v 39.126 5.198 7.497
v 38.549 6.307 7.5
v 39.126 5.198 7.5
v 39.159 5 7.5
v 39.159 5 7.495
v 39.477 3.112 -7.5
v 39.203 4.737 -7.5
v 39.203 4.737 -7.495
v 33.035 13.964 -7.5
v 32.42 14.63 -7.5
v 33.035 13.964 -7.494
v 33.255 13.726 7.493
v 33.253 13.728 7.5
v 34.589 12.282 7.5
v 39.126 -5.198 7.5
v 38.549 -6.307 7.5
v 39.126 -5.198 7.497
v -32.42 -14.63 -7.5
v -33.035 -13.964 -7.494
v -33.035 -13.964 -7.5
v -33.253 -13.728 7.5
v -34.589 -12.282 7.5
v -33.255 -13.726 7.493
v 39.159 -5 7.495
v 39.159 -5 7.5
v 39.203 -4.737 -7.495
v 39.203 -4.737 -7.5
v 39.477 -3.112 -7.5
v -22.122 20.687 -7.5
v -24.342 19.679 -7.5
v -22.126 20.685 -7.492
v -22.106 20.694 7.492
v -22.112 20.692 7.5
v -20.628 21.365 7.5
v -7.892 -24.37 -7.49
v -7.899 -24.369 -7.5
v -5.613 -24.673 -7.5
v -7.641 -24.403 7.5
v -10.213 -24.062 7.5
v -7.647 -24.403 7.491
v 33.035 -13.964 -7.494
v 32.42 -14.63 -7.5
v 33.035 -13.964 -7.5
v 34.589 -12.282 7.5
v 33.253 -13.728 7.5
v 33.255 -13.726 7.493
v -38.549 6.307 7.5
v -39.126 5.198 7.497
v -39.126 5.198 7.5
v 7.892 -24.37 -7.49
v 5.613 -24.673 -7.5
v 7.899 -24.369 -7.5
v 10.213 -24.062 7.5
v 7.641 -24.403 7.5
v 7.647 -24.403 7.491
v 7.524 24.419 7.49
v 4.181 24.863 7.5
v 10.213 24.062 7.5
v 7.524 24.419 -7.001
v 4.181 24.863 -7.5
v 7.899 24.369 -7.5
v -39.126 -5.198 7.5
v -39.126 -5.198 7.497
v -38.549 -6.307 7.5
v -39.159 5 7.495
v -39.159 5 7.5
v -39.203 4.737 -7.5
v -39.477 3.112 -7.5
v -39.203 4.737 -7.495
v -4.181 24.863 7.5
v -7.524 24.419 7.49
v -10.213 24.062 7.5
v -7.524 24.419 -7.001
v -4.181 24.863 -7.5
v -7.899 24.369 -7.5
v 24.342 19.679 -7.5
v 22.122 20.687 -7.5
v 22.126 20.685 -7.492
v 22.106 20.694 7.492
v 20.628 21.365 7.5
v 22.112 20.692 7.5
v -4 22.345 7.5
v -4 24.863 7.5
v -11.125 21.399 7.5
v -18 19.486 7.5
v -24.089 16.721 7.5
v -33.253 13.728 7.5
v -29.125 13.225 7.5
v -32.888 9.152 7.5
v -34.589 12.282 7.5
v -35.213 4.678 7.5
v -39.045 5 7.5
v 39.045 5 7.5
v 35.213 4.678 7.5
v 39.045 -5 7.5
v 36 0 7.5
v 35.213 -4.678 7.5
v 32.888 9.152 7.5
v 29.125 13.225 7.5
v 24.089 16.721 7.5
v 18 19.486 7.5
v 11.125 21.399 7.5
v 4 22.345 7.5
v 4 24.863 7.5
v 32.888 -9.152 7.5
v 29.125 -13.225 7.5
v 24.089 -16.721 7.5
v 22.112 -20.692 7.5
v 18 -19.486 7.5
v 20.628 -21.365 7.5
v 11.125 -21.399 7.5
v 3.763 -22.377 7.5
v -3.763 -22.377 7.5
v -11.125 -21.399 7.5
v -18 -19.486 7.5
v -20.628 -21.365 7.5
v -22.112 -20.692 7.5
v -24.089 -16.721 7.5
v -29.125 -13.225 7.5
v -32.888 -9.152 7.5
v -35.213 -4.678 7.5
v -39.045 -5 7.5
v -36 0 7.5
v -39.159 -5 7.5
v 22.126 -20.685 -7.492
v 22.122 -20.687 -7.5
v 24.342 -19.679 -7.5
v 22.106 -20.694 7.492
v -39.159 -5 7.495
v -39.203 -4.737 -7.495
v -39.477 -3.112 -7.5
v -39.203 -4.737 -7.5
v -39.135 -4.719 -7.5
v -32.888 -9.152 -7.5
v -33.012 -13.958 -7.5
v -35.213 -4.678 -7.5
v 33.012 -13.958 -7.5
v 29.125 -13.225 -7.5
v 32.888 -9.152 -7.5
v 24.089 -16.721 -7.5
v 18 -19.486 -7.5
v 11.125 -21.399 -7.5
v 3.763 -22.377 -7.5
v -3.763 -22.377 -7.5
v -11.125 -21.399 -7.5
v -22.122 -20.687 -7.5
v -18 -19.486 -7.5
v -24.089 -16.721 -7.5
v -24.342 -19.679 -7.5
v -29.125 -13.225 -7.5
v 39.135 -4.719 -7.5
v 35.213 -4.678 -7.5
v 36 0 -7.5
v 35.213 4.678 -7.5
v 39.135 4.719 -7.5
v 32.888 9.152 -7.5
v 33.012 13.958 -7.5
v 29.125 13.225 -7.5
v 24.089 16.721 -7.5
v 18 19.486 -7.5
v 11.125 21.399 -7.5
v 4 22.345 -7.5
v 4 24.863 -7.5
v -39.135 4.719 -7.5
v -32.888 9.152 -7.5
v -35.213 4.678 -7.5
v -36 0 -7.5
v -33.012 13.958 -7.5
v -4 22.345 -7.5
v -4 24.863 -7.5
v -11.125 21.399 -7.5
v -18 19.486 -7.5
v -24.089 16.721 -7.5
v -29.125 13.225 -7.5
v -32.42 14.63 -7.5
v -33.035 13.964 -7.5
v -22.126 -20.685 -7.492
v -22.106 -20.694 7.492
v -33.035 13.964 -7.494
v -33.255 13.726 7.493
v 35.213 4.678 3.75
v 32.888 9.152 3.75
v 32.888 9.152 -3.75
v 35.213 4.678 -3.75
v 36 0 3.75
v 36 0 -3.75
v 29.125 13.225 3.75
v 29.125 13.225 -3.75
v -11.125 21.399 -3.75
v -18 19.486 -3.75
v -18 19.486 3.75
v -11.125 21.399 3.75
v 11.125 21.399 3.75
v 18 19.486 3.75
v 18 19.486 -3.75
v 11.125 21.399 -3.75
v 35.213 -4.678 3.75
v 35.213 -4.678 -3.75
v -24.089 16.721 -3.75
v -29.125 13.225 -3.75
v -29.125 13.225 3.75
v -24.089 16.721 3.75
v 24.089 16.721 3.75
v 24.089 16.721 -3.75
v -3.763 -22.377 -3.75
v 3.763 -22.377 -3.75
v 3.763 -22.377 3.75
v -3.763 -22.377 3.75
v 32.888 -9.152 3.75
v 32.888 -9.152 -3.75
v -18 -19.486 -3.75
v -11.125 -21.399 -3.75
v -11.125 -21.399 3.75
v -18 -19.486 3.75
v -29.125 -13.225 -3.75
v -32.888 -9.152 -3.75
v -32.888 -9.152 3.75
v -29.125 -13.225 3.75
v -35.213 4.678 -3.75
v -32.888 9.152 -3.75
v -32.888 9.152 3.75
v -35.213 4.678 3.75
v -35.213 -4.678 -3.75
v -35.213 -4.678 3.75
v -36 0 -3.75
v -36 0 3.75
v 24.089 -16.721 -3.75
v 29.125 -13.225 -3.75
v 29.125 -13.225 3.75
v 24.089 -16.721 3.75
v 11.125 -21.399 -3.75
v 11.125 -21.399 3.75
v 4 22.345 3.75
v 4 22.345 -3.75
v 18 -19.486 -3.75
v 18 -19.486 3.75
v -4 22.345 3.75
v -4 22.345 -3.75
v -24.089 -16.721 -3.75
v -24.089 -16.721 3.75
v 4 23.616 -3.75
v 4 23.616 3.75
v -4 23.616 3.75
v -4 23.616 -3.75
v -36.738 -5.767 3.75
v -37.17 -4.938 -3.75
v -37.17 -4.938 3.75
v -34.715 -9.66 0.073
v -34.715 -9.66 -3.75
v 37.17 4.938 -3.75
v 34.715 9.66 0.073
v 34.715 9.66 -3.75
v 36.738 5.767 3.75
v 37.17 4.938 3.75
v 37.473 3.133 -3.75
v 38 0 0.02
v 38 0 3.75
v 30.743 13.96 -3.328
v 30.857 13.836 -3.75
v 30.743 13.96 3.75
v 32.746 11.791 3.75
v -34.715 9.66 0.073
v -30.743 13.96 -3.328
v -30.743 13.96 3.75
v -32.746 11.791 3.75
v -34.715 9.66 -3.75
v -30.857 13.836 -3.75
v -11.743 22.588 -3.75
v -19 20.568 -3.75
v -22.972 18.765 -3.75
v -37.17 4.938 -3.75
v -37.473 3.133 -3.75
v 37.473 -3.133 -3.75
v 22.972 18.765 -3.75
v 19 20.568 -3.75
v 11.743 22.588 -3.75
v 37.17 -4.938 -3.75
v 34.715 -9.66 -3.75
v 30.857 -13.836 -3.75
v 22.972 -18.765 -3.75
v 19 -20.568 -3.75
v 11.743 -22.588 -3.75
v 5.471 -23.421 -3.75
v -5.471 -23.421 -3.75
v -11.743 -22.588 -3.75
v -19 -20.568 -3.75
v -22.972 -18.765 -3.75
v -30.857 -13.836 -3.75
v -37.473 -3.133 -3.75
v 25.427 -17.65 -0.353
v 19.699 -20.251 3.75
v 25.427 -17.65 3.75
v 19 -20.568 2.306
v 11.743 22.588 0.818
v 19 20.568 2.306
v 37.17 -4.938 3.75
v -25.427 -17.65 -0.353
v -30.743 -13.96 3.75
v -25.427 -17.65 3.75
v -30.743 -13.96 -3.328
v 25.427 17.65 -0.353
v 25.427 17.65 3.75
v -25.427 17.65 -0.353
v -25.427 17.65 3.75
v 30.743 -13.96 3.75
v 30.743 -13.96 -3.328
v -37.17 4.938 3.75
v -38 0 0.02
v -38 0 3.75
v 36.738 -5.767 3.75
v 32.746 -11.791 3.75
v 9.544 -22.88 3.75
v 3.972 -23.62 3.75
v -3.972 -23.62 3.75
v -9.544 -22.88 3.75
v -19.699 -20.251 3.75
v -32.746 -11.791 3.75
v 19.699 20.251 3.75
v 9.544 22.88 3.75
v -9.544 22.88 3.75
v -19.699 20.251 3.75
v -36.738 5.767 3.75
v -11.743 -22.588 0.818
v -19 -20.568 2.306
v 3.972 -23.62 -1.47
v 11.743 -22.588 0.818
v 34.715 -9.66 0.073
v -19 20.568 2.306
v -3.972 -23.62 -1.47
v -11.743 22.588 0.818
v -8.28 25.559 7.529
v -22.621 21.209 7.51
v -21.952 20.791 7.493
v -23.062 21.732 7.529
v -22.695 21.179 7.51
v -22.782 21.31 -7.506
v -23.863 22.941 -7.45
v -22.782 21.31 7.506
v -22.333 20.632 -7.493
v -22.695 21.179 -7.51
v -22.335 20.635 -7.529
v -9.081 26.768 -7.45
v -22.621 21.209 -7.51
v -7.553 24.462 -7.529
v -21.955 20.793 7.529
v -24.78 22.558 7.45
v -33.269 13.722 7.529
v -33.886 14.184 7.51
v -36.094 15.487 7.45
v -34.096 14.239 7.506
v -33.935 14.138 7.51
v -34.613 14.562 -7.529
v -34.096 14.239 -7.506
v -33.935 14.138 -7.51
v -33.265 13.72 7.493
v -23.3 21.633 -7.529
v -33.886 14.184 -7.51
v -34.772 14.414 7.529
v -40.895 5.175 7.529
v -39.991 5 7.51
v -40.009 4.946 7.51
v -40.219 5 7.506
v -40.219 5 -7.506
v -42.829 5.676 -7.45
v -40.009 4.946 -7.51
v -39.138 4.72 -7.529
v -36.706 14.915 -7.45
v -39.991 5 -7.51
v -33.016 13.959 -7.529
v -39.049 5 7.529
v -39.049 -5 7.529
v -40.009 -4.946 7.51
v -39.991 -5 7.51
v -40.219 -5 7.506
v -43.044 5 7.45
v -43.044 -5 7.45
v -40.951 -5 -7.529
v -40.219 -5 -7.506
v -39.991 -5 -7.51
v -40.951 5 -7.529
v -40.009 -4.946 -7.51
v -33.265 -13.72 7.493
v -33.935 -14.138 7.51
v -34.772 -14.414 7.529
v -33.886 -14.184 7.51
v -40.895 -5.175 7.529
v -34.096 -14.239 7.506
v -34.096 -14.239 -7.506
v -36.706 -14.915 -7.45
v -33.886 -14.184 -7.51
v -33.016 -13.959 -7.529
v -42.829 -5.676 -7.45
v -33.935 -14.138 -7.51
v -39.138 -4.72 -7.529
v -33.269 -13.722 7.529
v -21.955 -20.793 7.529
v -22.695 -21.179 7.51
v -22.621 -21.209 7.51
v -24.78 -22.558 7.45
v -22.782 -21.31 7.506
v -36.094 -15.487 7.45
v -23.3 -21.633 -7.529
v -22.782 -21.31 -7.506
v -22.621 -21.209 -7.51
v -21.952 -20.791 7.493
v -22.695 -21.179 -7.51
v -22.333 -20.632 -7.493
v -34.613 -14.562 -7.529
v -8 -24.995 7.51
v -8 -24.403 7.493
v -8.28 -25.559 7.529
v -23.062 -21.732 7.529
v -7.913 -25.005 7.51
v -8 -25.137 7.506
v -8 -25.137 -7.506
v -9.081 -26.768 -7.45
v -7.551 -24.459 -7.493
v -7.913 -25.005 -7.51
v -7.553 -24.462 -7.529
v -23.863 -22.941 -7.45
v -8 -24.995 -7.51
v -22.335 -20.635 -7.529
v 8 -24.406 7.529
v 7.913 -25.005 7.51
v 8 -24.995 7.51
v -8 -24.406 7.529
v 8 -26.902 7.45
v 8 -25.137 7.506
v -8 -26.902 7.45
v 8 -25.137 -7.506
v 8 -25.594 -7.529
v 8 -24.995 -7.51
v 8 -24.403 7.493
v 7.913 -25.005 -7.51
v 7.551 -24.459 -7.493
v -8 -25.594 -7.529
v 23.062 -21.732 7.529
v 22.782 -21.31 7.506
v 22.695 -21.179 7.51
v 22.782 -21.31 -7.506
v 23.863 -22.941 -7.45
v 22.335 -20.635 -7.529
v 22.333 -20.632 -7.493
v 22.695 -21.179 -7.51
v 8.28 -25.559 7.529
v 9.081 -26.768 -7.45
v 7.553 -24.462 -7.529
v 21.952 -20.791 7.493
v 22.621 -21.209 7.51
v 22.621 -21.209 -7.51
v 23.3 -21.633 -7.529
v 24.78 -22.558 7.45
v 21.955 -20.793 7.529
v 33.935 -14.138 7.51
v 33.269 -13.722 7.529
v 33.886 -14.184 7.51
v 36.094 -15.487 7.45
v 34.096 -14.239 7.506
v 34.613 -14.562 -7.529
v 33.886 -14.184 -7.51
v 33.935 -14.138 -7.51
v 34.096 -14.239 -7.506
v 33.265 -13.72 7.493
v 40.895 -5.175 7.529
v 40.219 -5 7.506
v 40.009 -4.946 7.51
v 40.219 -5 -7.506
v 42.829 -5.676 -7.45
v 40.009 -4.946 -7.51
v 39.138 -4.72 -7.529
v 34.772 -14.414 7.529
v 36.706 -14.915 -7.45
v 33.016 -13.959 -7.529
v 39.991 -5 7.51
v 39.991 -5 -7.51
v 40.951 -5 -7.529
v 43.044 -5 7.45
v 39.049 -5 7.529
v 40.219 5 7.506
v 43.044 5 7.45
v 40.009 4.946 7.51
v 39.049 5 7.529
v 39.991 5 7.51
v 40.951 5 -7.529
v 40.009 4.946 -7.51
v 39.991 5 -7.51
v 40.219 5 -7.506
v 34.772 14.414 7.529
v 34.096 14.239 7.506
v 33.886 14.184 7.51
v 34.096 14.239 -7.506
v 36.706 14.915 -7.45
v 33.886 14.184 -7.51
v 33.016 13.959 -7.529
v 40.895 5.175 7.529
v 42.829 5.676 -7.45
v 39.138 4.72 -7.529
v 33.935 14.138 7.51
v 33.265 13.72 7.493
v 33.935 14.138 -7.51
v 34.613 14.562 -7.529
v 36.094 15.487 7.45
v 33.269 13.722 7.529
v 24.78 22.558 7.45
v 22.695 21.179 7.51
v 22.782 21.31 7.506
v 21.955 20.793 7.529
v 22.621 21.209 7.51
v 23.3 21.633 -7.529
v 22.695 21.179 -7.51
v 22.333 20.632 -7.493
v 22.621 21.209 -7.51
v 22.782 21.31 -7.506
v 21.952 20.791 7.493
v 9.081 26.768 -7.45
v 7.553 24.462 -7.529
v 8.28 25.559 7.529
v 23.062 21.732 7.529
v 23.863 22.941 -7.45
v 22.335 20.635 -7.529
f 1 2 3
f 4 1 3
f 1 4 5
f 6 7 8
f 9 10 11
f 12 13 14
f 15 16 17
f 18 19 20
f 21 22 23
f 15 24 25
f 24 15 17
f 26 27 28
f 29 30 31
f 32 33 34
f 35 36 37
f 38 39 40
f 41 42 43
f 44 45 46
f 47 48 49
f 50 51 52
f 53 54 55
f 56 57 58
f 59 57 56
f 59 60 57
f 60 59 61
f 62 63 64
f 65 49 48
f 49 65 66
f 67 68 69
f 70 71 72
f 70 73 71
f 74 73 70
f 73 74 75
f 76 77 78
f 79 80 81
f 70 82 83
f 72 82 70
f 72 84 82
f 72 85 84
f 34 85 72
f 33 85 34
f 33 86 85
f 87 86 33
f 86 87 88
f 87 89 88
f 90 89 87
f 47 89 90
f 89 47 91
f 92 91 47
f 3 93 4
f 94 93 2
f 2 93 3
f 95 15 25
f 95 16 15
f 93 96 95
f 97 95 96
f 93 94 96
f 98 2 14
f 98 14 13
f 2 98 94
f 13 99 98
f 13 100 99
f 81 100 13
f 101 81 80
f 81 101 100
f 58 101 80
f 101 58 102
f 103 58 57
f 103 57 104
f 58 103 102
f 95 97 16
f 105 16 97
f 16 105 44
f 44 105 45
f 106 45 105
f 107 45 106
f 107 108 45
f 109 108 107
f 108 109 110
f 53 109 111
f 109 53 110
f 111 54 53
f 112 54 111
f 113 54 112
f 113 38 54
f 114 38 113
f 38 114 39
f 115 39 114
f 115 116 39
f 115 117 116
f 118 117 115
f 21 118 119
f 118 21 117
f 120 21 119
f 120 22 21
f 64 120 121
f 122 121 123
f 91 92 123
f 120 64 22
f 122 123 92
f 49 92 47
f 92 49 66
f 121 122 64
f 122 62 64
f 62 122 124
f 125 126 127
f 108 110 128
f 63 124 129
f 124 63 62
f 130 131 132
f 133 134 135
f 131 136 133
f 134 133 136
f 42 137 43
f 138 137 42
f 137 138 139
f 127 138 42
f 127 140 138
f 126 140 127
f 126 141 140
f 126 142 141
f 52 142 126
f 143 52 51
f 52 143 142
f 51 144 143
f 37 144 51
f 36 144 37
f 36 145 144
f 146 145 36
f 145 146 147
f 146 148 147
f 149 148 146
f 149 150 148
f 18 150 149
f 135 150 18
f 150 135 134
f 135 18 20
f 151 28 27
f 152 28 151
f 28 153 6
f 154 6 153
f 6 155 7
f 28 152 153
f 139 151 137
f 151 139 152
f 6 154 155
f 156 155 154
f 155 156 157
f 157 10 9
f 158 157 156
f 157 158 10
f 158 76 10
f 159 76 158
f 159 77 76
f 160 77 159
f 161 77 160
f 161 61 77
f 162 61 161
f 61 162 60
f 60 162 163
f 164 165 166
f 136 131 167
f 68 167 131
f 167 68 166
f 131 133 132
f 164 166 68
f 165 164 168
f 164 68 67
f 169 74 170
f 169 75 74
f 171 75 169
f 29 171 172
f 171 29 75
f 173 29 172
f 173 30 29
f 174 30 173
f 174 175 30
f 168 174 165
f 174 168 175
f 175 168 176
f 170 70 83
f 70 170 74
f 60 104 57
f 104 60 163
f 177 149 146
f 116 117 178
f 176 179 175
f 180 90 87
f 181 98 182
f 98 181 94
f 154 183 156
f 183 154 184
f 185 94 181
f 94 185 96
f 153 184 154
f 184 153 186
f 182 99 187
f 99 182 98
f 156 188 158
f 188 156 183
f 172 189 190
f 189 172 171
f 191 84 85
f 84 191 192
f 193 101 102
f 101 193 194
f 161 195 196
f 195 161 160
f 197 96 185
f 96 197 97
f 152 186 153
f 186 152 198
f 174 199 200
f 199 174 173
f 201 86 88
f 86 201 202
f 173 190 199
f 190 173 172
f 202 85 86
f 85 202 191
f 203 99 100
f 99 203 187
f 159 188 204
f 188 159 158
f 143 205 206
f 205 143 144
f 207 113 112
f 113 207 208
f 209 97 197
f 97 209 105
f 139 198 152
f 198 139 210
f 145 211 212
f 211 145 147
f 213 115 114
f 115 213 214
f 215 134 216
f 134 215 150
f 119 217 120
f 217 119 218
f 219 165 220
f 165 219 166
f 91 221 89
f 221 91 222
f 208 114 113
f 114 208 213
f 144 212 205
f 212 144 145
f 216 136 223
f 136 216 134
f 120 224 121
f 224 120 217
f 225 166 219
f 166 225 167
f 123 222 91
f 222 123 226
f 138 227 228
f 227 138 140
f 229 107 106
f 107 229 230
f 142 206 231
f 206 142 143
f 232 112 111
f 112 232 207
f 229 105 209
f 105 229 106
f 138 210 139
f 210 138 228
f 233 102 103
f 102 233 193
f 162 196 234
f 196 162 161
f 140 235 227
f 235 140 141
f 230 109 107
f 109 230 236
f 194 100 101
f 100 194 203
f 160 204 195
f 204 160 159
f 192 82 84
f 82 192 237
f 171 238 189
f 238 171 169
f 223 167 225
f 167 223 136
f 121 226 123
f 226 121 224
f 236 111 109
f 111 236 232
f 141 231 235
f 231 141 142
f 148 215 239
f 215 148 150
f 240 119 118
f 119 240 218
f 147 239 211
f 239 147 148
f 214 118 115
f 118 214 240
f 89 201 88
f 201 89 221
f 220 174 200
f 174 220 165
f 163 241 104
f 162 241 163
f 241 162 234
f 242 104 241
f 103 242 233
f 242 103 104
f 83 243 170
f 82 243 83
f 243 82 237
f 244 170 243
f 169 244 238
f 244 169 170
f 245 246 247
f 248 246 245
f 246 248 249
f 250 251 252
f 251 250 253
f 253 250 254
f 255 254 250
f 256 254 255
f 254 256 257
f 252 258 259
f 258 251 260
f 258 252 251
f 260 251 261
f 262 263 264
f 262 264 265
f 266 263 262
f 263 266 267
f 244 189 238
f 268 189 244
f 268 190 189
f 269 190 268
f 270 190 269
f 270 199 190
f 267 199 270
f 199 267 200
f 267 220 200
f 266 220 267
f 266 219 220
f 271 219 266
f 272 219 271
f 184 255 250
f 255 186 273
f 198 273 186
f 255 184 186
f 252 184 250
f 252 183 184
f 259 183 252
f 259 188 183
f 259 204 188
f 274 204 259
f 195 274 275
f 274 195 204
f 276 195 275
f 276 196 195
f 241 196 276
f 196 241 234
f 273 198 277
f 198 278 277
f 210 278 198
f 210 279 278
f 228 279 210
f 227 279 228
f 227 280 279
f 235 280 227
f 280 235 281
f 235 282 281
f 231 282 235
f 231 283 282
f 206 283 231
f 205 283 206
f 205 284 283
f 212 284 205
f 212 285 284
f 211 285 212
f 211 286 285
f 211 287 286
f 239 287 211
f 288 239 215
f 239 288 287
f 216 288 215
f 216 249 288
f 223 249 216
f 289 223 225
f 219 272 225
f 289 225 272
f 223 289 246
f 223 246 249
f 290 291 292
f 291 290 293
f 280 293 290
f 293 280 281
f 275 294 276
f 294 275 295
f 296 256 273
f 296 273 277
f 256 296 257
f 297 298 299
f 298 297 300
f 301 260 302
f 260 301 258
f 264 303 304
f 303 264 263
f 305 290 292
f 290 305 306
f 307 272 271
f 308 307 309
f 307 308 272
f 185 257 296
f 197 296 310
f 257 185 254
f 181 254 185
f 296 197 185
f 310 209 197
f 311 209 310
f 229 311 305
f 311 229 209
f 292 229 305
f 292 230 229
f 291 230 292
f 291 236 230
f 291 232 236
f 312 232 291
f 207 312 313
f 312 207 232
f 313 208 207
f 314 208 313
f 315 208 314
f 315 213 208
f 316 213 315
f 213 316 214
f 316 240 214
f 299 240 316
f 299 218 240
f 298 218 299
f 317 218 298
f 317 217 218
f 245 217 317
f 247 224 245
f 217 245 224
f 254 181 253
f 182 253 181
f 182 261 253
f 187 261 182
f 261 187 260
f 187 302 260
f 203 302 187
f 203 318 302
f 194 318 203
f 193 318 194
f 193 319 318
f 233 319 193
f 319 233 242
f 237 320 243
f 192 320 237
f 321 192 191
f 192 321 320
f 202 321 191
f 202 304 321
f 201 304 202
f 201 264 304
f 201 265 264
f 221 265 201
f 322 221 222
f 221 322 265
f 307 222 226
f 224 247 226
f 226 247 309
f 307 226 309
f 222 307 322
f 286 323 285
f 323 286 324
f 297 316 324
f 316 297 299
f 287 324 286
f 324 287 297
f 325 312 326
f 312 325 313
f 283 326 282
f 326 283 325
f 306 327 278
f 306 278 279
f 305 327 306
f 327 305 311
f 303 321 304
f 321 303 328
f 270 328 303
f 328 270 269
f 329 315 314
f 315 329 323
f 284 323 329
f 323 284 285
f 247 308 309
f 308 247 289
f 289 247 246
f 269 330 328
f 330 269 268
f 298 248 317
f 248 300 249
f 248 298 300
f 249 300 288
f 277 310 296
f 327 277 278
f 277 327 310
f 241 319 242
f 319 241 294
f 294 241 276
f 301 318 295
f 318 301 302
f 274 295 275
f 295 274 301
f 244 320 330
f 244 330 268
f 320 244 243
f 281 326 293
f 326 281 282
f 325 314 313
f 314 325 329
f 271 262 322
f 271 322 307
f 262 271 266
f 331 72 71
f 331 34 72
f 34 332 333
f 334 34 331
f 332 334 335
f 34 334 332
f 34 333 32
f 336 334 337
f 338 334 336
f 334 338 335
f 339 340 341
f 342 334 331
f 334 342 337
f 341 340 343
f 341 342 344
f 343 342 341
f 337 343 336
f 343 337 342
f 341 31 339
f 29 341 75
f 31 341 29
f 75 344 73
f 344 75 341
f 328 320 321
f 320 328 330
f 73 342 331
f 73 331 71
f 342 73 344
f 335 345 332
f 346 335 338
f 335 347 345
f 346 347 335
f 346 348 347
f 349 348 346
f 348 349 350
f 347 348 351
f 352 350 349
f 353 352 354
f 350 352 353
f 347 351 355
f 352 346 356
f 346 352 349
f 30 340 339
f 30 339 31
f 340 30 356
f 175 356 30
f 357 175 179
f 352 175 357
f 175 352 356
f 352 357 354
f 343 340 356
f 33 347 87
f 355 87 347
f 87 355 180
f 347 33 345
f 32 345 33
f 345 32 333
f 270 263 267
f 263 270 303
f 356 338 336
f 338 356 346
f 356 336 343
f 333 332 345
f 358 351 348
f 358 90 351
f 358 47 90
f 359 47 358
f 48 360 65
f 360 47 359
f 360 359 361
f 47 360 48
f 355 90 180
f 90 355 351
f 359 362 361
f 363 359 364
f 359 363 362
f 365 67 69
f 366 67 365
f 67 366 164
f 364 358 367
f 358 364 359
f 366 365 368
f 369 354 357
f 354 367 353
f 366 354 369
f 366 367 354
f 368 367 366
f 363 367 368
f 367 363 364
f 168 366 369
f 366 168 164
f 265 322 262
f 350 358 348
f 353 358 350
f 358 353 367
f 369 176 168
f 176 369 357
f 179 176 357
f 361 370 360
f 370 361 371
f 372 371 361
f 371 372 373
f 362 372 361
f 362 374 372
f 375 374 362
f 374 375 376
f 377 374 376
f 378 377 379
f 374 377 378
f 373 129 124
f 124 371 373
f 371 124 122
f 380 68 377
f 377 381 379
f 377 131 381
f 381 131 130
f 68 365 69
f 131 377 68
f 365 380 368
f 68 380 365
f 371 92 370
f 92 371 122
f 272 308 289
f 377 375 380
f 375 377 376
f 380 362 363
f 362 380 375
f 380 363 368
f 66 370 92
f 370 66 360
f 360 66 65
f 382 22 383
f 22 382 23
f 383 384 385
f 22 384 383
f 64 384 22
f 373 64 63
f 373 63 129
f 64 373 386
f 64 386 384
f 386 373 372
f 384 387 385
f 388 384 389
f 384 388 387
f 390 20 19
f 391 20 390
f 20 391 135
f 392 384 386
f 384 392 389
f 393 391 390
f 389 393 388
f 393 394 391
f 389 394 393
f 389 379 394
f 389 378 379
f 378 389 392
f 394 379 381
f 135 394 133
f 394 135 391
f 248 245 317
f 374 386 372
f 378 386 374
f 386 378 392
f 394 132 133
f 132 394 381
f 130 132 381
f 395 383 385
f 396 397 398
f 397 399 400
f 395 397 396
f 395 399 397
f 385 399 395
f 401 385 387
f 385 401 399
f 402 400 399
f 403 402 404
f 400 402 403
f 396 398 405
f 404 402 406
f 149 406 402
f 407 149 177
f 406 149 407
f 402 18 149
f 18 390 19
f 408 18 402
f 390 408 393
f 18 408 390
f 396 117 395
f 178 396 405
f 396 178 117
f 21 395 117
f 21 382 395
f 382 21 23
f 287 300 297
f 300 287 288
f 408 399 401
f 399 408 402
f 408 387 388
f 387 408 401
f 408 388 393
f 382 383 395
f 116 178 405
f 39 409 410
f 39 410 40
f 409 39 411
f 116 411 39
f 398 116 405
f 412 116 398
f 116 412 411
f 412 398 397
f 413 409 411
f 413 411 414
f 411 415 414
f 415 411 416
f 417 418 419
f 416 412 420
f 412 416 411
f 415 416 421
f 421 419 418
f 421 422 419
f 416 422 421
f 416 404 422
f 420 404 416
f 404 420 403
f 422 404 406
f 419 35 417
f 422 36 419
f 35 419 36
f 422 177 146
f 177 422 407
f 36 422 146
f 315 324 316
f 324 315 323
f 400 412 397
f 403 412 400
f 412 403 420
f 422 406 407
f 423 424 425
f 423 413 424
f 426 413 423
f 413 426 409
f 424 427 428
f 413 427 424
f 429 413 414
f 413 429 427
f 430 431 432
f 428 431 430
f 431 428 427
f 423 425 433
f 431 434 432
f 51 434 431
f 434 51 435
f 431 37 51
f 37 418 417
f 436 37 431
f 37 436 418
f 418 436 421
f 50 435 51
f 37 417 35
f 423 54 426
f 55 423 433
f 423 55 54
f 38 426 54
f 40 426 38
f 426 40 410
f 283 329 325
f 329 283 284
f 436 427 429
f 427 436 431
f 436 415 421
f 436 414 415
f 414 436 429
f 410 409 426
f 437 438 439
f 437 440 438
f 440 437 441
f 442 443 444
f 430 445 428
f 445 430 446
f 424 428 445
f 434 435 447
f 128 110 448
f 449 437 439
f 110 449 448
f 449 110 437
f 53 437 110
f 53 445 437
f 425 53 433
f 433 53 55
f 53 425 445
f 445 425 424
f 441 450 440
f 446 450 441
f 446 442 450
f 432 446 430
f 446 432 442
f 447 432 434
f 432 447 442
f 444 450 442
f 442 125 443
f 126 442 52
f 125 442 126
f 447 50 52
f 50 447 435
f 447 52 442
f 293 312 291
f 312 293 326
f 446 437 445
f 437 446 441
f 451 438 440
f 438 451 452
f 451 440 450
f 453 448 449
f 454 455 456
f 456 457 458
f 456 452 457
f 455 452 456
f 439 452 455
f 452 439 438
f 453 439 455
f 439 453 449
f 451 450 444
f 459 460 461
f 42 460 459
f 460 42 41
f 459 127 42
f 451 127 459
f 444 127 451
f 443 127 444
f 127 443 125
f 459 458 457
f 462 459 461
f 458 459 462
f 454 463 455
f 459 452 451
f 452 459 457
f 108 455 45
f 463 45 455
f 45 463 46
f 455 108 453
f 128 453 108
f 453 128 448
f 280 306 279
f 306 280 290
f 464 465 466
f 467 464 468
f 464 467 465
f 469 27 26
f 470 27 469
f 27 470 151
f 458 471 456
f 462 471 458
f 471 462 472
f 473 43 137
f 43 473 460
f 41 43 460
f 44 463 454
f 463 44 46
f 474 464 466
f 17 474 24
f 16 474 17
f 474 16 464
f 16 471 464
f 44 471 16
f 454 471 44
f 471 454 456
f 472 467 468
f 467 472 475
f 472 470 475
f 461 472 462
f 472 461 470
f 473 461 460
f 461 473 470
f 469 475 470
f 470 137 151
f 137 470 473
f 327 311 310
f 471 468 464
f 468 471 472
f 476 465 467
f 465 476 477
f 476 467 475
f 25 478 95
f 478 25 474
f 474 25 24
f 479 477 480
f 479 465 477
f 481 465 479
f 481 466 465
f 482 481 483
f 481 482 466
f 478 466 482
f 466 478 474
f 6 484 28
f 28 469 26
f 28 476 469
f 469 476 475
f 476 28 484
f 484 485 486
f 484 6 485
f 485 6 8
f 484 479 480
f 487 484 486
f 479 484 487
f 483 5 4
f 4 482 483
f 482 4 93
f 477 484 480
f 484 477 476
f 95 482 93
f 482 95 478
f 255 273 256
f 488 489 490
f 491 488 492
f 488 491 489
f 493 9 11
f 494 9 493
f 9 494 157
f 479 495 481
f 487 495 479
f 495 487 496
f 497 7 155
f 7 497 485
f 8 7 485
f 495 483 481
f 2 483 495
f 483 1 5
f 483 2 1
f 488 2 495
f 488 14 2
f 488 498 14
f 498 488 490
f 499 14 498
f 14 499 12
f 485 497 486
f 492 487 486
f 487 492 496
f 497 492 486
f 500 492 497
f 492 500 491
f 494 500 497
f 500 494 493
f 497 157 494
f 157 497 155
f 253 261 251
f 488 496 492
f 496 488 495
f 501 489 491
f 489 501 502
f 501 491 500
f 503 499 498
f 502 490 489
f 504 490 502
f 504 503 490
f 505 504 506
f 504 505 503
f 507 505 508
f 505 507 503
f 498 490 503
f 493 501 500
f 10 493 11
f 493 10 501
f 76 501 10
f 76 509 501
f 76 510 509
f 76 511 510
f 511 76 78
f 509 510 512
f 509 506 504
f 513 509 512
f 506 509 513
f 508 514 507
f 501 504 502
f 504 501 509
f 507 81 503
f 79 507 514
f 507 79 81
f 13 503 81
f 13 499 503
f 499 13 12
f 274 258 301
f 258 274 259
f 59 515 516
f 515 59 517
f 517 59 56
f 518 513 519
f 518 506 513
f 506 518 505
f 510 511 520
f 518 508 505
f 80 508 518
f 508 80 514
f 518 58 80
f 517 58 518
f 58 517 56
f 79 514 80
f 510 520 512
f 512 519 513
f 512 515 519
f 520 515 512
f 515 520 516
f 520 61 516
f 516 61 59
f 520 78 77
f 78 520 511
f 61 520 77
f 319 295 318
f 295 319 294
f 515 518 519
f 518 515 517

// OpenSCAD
// file: simple.scad
include <../config.scad> 

/**/
scale([width/2/quality,height/2/quality,depth/quality]){
    
    difference(){

        cylinder(h = 1*quality, r1 = 1*quality, r2 = 1*quality, center=true){
        }

        cylinder(h = 1*quality, r1 = (1-thinkness)*quality, r2 = 0.9*quality, center=true){
        }

        translate([0,(1-(thinkness/2))*quality,0]){
            cube([join*quality,thinkness*quality*2,1*quality],true){}
        }
        
        cylinder(h = 0.5*quality, r1 = (1-(thinkness/2))*quality, r2 = (1-(thinkness/2))*quality, center=true){
        }
    }
    
    
       

}
/**/
// file: ../config.scad
width = 80;
height = 50;
depth=15;

thinkness=.1;
join=0.2;

quality=1000;
// main file
include <../config.scad> 
include <./simple.scad> 

/**/
scale([width/2,height/2,depth]){
    

    for (i = [1:1:(360/22.5)-1]) {
        rotate([0,0,22.5*i]){
            translate([0,1,0]){
                rotate([i%2==1?3:-3,0,0]){
                    cube([.4,.1,1],true){}
                }
            }
        }
    }



    /*difference(){

        cylinder(h = 1*quality, r1 = 1*quality, r2 = 1*quality, center=true){
        }

        cylinder(h = 1*quality, r1 = (1-thinkness)*quality, r2 = 0.9*quality, center=true){
        }

        translate([0,(1-(thinkness/2))*quality,0]){
            cube([join*quality,thinkness*quality*2,1*quality],true){}
        }
        
        cylinder(h = 0.5*quality, r1 = (1-(thinkness/2))*quality, r2 = 0.9*quality, center=true){
        }
    }
    */
    
       

}
/**/
